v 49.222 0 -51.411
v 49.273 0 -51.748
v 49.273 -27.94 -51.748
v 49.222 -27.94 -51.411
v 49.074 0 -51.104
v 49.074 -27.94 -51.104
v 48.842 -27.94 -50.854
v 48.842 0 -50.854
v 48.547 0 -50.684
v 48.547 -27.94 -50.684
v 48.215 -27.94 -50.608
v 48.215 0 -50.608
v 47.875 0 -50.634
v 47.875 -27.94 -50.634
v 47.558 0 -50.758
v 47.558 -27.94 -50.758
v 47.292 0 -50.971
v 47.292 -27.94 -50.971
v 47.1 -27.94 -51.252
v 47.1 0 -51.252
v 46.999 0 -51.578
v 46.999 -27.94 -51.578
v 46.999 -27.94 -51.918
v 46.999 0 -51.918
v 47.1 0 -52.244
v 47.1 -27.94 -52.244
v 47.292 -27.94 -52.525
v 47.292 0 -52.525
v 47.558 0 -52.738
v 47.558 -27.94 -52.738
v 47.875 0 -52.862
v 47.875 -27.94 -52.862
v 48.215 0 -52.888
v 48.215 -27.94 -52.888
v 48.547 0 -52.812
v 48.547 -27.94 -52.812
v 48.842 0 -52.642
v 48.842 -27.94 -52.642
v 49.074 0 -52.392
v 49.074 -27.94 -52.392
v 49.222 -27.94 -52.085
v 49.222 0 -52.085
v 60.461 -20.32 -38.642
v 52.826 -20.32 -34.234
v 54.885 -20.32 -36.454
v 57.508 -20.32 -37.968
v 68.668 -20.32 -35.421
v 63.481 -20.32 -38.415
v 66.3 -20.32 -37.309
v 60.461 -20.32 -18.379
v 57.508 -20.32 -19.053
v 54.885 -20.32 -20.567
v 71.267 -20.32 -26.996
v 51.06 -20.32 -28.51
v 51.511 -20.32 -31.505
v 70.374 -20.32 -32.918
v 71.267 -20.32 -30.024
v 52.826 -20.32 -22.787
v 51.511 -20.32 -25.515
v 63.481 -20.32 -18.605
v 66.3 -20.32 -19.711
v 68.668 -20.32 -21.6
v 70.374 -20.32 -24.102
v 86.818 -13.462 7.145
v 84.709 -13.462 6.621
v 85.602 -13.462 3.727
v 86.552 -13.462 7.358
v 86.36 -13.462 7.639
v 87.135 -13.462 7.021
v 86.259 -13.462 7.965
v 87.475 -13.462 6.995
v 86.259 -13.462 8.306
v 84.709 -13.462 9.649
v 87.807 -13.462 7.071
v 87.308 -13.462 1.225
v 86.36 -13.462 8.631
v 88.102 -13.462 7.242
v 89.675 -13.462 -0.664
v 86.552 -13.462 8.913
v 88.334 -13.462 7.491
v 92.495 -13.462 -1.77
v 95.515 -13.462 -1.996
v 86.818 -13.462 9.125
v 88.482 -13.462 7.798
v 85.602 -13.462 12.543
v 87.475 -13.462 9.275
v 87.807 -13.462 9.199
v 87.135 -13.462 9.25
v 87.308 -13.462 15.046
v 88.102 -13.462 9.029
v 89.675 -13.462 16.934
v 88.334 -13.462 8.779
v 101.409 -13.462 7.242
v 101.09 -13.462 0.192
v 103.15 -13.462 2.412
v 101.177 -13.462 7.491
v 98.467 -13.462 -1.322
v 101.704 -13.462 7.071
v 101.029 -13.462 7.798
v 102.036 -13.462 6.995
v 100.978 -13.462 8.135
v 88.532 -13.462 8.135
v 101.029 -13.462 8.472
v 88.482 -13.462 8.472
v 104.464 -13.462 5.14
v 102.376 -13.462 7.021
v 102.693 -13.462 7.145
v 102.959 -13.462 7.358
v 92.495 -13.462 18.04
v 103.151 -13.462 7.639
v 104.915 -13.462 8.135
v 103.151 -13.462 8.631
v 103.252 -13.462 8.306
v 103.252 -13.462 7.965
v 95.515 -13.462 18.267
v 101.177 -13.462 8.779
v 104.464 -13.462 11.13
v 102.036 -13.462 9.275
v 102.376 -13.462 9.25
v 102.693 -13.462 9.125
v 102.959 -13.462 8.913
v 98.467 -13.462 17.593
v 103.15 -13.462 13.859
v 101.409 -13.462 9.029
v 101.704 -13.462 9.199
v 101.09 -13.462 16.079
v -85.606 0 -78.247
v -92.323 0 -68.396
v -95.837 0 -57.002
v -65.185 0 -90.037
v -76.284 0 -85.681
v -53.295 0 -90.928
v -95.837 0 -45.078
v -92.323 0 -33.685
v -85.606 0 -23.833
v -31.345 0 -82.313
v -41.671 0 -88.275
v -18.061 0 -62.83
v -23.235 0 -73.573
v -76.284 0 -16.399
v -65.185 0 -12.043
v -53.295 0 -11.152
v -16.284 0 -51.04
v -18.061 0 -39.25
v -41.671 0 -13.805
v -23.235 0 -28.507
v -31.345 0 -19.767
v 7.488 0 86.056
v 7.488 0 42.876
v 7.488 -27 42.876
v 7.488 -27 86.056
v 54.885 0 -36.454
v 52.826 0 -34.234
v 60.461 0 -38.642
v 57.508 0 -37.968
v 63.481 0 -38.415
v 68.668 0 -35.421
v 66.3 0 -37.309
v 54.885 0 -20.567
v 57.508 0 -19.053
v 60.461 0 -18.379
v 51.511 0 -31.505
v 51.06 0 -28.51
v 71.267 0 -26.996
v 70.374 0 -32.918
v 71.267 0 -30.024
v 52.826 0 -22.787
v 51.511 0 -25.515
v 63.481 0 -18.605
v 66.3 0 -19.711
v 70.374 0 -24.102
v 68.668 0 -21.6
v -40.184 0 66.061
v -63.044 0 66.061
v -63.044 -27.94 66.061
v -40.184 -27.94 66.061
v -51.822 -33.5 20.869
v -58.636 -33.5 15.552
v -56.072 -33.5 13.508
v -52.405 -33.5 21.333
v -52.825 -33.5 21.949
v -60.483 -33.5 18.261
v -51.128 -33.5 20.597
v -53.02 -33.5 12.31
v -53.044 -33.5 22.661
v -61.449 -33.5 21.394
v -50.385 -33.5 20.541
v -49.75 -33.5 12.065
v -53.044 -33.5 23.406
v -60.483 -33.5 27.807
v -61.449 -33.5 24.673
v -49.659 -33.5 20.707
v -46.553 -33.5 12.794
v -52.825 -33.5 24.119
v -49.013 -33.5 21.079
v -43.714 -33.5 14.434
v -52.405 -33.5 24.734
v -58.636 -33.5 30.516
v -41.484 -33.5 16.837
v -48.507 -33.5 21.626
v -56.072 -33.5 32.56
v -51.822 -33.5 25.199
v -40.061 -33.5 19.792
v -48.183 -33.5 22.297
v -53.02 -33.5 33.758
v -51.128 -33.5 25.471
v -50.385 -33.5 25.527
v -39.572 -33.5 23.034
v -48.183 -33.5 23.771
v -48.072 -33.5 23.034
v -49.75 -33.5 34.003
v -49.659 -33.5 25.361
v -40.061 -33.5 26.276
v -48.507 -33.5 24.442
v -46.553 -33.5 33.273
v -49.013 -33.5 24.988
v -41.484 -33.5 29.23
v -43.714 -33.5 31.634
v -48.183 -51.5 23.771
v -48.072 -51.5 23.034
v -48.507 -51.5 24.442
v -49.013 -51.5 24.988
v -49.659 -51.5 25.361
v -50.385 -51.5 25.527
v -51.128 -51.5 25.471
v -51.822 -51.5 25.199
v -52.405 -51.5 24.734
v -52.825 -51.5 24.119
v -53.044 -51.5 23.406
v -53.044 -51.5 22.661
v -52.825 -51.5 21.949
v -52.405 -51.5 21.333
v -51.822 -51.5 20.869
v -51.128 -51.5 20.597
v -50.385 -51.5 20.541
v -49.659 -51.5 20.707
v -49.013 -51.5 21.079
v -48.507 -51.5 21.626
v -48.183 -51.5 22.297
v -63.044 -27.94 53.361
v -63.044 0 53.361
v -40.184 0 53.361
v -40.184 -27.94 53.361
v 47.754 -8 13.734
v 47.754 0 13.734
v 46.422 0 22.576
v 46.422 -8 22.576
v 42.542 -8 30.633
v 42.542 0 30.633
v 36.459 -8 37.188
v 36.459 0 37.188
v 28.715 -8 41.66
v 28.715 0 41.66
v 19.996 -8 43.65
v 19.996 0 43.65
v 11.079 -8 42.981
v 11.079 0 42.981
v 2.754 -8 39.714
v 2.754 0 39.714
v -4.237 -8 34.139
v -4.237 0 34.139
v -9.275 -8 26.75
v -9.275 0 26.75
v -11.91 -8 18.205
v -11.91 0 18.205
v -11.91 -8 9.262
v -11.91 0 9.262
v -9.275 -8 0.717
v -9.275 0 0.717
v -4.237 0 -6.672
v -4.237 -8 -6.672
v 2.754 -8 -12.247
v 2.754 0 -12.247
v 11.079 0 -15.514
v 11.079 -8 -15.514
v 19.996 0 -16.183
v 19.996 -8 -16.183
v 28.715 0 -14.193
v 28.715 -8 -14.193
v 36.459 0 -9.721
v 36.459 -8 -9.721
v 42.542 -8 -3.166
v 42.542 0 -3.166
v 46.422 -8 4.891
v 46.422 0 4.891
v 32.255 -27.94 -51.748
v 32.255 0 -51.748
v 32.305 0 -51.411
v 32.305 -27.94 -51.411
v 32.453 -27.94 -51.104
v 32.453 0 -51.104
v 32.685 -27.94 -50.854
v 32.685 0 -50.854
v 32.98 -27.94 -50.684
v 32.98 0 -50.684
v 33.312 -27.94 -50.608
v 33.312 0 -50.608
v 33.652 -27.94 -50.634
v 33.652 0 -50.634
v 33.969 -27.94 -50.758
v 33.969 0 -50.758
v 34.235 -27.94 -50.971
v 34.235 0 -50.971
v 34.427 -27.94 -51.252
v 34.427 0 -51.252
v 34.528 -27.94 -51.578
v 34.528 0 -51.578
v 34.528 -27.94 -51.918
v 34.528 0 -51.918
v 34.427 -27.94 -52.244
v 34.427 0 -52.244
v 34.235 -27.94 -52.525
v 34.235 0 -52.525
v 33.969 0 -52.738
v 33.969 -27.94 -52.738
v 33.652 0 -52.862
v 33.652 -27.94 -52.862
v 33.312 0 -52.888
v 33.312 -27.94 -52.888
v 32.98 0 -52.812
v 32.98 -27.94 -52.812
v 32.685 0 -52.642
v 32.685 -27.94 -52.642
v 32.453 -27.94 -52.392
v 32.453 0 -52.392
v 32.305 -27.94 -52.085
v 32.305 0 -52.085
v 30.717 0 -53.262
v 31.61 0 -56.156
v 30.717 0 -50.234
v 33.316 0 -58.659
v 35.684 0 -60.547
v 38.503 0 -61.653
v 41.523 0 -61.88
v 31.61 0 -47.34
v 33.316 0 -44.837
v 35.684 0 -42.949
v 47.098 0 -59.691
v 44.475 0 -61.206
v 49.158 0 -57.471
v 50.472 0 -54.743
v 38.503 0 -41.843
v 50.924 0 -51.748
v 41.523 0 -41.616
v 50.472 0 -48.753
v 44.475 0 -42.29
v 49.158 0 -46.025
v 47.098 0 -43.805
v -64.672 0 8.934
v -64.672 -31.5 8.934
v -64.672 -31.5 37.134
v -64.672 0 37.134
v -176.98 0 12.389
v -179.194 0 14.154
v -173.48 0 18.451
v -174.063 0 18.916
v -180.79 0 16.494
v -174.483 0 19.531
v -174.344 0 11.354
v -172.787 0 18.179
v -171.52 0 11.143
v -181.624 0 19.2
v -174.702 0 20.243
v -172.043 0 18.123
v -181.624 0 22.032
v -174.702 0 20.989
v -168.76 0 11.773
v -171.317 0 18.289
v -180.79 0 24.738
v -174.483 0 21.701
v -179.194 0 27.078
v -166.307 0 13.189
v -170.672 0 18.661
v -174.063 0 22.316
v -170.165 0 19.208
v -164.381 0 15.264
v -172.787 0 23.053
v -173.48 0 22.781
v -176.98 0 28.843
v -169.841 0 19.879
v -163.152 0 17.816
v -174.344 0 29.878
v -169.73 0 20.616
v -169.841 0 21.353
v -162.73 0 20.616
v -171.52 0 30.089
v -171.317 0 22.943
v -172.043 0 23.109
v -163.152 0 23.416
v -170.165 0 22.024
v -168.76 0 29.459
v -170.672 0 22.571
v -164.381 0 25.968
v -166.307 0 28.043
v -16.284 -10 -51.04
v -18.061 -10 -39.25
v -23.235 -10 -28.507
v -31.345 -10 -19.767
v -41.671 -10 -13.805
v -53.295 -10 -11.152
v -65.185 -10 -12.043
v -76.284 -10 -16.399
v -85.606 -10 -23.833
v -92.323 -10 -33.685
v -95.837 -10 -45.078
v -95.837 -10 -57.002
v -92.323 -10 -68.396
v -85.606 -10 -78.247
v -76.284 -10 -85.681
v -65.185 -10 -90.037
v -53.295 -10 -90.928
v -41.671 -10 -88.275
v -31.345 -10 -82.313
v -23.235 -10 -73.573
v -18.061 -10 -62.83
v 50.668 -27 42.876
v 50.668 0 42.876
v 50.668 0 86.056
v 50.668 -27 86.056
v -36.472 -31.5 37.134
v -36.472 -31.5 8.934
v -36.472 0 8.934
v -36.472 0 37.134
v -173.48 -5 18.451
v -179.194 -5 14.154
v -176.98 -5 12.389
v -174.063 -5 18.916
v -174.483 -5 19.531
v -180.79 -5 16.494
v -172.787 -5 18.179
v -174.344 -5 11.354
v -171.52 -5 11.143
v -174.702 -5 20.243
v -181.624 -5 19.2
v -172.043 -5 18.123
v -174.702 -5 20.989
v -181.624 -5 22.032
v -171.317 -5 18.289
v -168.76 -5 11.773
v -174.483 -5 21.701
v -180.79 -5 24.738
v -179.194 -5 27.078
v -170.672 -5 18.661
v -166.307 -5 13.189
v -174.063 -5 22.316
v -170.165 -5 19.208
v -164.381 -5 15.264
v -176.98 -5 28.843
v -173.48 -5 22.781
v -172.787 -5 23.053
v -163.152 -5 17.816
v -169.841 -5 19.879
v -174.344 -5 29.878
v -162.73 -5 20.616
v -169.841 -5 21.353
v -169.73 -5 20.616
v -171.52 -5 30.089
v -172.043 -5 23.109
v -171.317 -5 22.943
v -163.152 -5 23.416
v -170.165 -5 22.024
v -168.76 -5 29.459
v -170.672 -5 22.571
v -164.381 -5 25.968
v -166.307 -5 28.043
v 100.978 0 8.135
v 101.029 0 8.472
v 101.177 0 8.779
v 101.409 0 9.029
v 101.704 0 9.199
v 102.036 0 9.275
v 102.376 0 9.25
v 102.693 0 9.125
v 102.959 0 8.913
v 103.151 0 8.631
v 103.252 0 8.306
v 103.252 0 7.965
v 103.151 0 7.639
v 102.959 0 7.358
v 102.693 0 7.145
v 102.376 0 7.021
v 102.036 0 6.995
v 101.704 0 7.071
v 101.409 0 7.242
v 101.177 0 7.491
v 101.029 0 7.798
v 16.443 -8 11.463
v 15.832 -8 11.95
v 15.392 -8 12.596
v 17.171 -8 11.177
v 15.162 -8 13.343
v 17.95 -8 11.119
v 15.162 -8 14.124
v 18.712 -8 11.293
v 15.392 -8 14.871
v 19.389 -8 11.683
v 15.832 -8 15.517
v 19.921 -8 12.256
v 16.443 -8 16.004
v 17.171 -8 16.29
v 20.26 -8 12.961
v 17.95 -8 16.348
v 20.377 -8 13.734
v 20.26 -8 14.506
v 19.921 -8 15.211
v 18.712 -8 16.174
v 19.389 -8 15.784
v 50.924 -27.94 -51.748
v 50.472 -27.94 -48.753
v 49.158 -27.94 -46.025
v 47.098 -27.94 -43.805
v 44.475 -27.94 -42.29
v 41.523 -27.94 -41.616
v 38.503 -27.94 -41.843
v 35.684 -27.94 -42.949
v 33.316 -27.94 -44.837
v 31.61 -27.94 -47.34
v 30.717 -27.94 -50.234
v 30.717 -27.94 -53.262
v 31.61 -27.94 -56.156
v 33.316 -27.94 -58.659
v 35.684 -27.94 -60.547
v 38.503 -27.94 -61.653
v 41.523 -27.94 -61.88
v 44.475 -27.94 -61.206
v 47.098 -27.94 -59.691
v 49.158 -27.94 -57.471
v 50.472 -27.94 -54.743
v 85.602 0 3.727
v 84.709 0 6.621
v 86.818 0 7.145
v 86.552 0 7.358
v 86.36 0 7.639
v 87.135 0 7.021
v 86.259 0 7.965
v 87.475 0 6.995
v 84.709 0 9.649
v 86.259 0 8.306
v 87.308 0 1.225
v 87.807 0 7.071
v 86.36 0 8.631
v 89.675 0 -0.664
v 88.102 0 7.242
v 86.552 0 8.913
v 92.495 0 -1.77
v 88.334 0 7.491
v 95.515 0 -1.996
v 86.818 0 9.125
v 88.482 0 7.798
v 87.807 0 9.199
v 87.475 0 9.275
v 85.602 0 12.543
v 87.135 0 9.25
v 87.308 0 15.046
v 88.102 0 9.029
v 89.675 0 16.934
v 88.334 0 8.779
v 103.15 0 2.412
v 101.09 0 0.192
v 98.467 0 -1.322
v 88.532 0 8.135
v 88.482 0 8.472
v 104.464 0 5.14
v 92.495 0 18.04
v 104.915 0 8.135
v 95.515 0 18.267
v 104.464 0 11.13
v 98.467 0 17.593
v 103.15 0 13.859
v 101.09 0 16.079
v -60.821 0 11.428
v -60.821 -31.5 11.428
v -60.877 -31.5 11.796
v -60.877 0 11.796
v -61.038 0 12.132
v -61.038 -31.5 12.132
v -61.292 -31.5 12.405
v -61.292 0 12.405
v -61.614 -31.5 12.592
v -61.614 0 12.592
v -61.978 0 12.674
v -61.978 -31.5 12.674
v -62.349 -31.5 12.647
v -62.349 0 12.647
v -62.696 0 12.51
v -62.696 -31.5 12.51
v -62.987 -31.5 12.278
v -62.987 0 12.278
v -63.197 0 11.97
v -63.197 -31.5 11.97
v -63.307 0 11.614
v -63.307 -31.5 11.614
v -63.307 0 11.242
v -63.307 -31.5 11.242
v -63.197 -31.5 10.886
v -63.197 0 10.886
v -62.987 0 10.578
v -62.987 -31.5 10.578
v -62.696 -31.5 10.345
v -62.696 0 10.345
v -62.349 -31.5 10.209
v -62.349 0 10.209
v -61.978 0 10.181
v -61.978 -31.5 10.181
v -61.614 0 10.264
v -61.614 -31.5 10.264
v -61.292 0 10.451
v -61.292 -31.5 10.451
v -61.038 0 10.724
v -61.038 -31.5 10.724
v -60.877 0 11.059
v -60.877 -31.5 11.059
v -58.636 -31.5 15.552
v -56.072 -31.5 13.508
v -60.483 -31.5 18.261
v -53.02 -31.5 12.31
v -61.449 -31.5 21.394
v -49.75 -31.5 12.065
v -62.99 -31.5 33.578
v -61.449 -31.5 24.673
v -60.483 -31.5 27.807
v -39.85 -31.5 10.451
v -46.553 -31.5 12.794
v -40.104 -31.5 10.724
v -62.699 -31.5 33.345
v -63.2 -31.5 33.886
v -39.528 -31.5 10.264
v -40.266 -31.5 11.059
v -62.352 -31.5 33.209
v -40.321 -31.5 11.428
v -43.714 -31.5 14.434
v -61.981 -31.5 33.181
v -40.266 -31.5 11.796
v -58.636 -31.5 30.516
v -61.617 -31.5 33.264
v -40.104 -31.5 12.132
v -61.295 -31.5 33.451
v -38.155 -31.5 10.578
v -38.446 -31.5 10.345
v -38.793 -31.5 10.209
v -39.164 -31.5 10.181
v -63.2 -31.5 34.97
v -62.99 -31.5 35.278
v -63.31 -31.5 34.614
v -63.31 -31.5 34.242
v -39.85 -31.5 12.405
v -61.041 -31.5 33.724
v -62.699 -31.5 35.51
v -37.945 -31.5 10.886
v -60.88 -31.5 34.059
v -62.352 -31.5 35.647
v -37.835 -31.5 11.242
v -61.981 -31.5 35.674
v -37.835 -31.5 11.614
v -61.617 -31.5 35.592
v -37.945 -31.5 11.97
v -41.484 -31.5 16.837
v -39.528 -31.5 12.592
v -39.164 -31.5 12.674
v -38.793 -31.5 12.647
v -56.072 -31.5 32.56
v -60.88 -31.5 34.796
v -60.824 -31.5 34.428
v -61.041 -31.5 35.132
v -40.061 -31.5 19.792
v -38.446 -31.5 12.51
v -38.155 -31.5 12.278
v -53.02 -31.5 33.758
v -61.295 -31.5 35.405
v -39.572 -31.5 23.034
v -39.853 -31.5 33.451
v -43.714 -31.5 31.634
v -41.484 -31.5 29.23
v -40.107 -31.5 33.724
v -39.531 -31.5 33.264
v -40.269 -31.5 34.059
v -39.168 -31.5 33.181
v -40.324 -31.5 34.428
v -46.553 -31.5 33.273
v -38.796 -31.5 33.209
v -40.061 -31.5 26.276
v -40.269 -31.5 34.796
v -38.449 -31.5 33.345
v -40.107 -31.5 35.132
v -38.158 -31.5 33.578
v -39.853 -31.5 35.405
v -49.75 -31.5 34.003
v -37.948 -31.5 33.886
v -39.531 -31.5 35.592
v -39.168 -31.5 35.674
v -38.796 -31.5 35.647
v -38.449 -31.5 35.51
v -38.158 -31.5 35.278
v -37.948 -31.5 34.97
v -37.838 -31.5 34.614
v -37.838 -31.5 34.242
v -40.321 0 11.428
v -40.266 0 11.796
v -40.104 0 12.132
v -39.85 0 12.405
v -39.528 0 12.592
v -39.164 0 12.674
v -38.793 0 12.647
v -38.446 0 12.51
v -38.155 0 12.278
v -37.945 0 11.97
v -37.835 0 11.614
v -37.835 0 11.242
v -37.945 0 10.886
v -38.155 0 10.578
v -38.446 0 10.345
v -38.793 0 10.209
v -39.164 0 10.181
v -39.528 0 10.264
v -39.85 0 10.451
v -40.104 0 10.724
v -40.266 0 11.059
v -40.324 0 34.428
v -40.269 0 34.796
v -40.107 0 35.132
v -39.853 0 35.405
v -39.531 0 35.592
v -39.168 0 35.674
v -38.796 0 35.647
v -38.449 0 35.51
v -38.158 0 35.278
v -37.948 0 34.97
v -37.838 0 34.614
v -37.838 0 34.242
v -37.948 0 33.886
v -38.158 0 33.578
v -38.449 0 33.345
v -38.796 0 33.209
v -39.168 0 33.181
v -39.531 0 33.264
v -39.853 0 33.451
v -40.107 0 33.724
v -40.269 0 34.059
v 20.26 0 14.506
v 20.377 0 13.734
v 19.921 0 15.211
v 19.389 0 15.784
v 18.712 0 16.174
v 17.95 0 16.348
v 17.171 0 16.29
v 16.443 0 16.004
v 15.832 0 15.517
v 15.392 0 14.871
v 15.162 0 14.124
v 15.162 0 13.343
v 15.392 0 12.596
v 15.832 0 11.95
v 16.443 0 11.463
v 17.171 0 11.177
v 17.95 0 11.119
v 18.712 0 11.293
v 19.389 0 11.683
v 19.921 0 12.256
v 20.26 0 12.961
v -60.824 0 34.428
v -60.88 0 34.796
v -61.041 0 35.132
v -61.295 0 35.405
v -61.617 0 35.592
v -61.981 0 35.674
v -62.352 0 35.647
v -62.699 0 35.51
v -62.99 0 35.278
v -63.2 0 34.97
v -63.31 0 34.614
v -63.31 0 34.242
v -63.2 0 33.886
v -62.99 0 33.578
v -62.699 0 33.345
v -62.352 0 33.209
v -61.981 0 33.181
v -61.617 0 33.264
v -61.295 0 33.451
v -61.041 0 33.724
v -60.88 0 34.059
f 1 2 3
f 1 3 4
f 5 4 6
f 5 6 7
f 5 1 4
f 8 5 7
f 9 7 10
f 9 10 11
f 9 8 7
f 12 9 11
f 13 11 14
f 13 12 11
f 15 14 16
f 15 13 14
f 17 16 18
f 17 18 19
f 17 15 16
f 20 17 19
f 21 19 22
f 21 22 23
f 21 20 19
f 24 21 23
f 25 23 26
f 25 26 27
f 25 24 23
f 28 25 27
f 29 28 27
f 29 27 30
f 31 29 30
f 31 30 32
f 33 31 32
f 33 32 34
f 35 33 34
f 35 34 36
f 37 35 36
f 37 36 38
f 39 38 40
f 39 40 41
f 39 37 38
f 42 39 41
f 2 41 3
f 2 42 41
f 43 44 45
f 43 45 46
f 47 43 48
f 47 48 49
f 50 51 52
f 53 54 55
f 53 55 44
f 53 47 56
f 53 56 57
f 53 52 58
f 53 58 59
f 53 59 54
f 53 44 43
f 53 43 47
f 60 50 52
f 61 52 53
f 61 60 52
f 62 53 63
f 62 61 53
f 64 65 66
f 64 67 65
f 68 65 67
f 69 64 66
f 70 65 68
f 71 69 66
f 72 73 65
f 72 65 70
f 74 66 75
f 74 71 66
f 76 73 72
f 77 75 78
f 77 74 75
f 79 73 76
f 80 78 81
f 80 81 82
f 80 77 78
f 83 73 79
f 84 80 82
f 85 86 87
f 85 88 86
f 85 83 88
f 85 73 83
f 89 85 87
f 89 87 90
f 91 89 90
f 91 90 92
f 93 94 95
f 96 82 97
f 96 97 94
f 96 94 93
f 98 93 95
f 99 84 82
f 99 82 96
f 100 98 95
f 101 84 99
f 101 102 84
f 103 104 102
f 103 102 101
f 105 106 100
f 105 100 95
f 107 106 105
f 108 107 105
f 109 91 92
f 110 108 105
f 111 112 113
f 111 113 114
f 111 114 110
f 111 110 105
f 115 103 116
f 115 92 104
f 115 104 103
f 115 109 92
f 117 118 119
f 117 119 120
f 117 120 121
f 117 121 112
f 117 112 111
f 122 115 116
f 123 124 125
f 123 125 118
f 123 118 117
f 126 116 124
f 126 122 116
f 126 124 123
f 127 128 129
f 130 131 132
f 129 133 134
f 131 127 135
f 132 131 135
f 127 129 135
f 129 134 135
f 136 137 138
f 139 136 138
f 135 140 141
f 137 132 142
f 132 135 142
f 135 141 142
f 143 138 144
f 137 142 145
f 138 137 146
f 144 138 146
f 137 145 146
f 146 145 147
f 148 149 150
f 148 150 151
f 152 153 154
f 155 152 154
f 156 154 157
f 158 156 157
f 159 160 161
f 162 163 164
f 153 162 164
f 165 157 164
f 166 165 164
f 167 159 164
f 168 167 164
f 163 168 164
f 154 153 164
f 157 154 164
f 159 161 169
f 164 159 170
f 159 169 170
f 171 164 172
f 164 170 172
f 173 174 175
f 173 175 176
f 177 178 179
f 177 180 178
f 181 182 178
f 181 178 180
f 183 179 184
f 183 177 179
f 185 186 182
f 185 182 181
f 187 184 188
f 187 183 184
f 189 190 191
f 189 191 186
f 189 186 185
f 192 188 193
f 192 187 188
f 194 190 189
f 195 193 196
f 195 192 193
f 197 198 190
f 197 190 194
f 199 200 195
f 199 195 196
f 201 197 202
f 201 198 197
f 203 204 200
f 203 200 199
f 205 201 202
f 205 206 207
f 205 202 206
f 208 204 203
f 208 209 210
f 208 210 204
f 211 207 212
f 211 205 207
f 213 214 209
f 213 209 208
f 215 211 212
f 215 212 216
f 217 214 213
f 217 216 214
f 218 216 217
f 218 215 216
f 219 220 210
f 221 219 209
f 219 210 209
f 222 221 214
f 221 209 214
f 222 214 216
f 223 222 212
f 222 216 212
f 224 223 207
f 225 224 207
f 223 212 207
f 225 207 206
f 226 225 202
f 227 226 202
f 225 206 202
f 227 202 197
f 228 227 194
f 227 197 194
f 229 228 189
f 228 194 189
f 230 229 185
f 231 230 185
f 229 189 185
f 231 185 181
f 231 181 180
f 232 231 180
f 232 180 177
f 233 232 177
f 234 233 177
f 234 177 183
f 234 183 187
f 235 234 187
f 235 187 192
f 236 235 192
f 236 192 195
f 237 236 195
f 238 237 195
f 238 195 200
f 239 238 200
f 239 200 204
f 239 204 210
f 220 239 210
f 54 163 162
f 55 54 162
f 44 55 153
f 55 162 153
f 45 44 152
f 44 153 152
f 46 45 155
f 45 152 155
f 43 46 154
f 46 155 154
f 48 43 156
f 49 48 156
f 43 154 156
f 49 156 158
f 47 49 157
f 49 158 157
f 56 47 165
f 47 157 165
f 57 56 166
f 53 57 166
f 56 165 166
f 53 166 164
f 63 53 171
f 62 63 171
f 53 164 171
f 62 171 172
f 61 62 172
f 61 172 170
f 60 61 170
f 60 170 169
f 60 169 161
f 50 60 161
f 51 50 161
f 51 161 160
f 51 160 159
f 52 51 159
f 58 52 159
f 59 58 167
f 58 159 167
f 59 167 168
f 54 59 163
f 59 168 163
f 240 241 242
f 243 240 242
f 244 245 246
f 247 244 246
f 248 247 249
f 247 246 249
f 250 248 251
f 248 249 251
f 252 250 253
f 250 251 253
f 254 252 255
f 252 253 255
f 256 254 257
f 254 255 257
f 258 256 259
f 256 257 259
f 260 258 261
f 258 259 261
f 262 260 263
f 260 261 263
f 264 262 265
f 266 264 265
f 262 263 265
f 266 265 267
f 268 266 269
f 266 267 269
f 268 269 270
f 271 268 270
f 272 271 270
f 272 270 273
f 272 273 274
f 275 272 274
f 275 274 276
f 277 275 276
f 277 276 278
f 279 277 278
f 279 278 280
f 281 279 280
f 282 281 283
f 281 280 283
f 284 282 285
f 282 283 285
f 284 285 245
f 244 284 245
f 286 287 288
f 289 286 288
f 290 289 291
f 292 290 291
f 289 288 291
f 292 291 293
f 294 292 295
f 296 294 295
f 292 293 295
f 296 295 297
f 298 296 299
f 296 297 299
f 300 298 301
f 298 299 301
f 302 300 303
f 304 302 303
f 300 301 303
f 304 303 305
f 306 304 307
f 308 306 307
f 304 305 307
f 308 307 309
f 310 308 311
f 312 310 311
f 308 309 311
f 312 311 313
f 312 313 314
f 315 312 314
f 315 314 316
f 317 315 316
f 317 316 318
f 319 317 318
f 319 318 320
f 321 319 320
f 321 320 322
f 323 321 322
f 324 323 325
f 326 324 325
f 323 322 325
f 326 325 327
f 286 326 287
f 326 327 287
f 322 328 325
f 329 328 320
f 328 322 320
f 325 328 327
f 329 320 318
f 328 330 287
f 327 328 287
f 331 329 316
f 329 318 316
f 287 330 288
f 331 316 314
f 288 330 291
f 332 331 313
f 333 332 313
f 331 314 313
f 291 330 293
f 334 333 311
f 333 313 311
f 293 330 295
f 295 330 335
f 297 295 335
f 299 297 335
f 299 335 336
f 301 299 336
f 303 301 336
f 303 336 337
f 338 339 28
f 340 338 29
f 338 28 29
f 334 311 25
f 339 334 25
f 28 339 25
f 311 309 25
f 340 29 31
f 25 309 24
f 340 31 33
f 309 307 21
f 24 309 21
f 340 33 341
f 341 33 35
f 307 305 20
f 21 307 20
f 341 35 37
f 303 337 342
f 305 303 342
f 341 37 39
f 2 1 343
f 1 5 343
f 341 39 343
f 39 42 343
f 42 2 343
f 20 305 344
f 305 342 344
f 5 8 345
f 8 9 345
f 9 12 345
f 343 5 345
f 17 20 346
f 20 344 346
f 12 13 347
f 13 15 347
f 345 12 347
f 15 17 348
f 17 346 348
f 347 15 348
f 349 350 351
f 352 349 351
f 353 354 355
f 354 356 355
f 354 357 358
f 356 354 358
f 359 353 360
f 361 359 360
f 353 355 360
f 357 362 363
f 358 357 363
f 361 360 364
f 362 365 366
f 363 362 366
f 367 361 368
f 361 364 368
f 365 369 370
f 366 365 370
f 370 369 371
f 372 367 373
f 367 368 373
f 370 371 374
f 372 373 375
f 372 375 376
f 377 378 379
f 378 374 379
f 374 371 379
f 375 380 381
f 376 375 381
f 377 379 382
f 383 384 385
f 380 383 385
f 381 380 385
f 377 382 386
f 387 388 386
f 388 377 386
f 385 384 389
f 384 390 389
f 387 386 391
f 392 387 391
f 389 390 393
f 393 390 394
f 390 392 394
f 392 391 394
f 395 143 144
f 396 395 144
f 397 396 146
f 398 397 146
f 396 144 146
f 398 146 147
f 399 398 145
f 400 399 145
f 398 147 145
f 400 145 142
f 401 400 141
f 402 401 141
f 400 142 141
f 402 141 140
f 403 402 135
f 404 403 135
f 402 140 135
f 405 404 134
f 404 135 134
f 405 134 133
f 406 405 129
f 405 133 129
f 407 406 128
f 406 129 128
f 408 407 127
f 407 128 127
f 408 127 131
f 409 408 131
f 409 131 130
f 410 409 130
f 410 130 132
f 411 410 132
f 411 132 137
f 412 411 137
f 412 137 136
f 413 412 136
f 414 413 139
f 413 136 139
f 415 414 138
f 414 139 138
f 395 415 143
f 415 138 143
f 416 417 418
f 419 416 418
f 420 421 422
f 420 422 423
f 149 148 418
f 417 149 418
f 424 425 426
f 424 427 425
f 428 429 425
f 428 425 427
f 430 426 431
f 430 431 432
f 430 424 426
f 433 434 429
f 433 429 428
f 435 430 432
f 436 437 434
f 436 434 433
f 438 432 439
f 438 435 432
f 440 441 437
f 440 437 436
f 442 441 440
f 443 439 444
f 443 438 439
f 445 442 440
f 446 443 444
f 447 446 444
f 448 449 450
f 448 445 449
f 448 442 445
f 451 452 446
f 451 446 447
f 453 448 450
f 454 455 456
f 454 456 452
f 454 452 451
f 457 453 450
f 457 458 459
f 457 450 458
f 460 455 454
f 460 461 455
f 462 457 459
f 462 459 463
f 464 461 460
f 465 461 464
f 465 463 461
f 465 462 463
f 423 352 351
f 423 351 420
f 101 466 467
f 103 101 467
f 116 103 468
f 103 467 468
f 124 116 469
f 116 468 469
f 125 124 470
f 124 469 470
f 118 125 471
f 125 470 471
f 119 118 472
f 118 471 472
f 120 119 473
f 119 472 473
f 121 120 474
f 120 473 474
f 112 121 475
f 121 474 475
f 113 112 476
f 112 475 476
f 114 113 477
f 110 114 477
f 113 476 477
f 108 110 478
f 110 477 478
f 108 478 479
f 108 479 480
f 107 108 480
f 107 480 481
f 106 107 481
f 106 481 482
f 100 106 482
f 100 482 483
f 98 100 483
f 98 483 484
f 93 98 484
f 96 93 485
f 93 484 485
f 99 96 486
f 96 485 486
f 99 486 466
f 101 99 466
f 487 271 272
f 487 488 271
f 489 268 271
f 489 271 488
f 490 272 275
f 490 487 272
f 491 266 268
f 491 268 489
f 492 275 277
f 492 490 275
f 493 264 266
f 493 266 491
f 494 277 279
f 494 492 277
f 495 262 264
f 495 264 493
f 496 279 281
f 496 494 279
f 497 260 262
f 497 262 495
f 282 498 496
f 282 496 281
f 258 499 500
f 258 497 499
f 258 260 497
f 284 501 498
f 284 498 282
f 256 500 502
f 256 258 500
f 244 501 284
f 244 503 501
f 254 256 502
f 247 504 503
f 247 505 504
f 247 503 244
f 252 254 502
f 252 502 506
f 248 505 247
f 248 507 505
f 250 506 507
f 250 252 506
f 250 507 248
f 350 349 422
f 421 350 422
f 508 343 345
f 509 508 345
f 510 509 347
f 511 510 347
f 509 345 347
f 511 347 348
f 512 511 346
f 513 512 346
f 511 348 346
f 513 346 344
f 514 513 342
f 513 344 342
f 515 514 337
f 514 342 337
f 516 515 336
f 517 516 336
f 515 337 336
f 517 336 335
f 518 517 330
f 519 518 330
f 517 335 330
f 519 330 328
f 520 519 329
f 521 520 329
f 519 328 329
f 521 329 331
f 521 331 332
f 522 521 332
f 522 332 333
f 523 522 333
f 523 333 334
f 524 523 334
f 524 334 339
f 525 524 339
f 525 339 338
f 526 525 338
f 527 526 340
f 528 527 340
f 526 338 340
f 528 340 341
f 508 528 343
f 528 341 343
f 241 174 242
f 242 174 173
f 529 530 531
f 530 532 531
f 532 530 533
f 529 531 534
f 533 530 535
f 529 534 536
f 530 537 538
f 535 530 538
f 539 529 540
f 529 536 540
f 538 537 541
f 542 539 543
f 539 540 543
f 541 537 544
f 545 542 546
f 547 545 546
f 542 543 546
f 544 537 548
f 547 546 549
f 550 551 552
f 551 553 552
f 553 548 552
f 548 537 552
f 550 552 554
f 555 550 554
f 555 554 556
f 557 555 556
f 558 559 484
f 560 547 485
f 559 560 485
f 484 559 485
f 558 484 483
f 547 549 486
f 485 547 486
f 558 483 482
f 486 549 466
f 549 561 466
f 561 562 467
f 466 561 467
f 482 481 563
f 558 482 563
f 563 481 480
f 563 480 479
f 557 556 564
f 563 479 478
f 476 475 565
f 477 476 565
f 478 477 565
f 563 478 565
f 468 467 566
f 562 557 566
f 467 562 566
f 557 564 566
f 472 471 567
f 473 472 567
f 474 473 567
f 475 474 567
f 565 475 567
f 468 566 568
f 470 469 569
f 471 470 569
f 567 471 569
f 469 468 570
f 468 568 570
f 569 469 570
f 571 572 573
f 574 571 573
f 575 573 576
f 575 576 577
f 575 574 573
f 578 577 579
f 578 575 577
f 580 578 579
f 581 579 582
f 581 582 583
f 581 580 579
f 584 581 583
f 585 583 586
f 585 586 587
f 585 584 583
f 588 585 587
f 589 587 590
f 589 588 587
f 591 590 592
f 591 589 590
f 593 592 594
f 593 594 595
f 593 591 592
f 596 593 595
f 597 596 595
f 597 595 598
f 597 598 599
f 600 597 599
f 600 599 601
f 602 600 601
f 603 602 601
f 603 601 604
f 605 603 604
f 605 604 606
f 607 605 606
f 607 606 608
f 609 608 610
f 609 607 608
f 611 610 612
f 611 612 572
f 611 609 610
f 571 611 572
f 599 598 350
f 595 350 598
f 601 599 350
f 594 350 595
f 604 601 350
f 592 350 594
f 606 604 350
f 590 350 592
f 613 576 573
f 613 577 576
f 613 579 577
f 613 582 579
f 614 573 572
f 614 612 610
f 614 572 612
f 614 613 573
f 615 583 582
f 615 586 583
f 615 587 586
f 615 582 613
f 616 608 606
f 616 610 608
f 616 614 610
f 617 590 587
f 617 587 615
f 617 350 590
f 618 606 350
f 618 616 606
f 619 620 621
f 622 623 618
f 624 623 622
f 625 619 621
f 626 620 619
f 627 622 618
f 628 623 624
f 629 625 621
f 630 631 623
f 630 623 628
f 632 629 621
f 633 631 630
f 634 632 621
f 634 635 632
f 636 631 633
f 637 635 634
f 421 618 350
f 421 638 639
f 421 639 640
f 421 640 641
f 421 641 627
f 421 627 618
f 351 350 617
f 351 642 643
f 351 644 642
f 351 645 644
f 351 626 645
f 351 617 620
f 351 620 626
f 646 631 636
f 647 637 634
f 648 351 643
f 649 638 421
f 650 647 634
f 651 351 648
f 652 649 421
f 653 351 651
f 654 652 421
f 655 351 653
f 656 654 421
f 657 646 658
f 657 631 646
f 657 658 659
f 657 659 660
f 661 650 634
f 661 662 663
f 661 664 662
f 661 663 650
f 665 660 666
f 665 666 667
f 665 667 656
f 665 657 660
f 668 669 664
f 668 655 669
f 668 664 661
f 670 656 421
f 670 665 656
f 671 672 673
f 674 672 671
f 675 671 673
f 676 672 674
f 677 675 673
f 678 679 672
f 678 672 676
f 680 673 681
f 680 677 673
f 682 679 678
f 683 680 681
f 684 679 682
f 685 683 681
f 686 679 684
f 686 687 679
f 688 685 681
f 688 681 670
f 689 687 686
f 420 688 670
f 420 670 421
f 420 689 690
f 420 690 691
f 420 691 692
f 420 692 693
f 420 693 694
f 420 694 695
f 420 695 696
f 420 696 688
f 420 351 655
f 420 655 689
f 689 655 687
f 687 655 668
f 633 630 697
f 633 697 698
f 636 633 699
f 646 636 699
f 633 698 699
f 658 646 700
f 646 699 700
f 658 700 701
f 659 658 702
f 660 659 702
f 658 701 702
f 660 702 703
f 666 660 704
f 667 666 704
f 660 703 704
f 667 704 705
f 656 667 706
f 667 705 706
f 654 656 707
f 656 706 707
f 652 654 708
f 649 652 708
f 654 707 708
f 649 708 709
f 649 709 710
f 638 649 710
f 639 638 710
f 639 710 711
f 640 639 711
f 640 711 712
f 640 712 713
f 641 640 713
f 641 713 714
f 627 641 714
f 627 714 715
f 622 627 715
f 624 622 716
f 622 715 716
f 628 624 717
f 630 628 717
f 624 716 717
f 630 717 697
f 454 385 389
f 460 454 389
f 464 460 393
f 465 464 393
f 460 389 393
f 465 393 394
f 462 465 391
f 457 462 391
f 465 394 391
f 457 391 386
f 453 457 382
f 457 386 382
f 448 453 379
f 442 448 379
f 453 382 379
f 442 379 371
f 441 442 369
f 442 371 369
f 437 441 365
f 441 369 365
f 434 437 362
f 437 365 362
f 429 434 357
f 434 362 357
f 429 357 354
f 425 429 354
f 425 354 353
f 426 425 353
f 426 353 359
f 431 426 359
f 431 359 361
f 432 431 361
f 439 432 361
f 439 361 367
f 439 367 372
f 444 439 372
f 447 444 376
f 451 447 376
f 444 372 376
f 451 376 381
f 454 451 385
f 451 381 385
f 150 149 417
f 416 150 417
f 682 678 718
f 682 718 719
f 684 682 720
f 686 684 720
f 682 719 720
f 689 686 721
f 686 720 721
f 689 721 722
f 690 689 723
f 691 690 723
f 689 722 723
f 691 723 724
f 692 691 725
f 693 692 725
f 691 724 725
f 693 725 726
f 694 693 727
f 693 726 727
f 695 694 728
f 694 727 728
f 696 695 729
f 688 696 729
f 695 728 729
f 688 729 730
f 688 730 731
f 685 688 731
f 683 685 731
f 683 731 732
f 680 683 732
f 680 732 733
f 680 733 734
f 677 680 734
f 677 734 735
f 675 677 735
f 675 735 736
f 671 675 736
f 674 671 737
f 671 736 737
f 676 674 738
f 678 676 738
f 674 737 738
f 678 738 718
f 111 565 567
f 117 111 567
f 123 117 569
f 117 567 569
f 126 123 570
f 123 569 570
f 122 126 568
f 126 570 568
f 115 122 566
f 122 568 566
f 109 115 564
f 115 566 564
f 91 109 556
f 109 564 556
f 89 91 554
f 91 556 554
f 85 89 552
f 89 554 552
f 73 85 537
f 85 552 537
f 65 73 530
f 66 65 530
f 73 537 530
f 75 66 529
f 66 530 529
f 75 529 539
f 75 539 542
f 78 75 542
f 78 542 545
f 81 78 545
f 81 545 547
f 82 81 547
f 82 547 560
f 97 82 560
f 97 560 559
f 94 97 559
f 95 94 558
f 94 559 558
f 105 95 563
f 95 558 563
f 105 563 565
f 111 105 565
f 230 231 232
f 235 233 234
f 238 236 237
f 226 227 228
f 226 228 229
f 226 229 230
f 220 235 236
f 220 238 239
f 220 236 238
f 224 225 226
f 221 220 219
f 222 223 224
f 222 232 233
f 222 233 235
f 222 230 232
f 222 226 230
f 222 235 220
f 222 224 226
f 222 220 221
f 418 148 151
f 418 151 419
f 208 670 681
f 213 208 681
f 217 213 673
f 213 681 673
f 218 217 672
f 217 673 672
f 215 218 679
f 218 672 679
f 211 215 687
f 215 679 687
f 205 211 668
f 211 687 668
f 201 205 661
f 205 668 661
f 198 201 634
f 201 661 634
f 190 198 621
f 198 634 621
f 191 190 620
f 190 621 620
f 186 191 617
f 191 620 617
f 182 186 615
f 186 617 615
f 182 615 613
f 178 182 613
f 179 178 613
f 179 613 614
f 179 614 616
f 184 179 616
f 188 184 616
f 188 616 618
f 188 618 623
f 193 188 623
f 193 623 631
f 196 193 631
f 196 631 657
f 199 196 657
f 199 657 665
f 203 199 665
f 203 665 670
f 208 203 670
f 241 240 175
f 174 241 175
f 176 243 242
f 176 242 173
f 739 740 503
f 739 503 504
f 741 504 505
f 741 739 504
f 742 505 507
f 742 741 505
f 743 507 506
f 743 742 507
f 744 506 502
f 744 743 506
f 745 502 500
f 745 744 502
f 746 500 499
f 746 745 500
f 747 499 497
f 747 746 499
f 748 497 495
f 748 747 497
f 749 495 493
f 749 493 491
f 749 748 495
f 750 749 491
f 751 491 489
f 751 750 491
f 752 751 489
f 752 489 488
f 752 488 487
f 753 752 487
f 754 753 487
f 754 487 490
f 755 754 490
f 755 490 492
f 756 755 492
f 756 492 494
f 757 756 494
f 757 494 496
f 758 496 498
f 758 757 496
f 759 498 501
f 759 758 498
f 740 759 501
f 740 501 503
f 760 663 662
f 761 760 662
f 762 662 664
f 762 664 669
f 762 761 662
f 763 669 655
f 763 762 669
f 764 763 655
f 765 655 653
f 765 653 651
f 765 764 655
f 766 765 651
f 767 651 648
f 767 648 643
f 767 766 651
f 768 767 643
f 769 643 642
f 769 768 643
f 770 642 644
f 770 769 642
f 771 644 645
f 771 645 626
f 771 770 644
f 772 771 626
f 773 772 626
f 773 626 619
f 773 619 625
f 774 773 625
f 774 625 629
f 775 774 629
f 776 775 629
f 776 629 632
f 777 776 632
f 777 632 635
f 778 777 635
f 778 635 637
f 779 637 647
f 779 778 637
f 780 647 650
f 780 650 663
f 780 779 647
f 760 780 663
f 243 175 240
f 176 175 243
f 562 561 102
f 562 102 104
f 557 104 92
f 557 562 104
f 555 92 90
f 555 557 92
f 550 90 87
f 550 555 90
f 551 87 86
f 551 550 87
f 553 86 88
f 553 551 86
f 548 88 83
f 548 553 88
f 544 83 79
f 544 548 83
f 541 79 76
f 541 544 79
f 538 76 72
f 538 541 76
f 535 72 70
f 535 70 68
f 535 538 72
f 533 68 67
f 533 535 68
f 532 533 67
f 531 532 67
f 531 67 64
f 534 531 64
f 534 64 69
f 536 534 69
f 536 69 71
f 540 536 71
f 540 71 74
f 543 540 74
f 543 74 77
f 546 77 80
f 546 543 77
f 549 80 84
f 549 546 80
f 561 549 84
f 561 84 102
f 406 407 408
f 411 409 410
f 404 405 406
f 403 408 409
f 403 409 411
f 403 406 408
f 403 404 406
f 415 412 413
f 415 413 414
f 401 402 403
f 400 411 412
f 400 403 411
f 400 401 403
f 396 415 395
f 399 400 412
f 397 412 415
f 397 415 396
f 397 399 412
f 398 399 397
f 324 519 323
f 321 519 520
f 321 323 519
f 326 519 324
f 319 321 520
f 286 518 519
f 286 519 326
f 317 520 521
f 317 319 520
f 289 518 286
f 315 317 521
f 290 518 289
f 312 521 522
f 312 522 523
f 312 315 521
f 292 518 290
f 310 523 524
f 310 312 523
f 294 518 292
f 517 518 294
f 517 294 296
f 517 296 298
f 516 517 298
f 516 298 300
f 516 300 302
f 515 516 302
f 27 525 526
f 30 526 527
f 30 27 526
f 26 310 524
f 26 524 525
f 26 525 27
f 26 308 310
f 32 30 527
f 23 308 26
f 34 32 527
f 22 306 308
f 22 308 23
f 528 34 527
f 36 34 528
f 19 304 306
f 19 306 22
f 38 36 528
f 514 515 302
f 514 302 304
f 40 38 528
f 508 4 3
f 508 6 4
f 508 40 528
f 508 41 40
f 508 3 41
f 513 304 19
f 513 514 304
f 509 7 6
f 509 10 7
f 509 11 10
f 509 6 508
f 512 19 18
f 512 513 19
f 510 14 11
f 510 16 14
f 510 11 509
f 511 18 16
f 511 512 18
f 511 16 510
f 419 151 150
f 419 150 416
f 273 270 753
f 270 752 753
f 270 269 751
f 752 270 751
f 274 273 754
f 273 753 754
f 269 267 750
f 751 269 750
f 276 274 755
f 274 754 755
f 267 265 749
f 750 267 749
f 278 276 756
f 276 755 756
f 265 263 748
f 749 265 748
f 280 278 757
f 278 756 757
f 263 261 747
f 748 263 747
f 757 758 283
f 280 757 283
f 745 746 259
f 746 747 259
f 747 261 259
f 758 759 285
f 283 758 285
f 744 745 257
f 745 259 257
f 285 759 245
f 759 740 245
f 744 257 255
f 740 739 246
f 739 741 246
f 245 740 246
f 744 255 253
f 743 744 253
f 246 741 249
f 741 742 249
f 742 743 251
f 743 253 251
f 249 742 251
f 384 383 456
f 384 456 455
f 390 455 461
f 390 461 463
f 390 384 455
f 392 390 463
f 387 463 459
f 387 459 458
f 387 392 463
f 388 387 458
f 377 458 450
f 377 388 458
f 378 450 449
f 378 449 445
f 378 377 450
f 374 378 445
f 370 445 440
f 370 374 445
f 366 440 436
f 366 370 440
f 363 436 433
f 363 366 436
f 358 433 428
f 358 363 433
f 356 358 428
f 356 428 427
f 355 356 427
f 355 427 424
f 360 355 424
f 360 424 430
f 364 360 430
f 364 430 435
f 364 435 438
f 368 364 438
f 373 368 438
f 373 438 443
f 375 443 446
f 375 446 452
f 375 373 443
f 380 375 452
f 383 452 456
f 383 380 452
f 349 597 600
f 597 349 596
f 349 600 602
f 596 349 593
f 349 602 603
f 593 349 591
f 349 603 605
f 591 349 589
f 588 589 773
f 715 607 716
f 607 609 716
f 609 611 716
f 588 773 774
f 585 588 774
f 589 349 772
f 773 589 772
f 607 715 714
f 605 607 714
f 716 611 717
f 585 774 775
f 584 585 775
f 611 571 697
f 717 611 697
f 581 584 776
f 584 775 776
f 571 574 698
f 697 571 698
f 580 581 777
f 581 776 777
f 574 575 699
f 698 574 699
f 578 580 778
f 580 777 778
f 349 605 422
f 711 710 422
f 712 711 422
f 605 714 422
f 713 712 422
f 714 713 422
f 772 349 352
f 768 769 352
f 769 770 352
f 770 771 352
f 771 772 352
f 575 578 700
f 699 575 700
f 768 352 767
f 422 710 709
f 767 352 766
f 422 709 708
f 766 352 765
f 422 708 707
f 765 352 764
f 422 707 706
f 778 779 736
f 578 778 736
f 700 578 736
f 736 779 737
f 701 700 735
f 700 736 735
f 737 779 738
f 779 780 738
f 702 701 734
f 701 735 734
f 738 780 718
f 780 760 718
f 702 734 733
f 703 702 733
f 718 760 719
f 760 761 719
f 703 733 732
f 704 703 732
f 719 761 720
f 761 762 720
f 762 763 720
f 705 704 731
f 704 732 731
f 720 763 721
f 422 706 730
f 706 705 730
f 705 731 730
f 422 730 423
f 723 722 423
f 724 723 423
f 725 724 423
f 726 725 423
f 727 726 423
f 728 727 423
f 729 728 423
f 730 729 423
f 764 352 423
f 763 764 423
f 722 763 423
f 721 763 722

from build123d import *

# Parameters (mm, degrees)
F0_R      = 2.5
F1_DEPTH  = 51.5
F0_R_2    = 11
F2_DEPTH  = 33.5
F0_W      = 28.2
F0_H      = 28.2
F0_R_3    = 1.25
F3_DEPTH  = 31.5
F4_R      = 30
F4_R_2    = 2.6221966913
F5_DEPTH  = 8
F6_R      = 40
F7_DEPTH  = 10
F8_R      = 1.143
F9_DEPTH  = 27.94
F10_DEPTH = 20.32
F12_W     = 43.18
F12_H     = 43.18
F13_DEPTH = 27
F14_W     = 22.86
F14_H     = 12.7
F15_DEPTH = 27.94
F8_R_2    = 10.16
F16_DEPTH = 13.462
F6_R_2    = 9.5
F6_R_3    = 2.5
F17_DEPTH = 5


with BuildPart() as f1:
    # F0 (on Front) → F1 (new body)
    with BuildSketch(Plane.XZ):
        with Locations((-50.5721733682, 23.0338863699)):
            Circle(F0_R)
    extrude(amount=F1_DEPTH)

    # F0 (on Front) → F2 (join)
    with BuildSketch(Plane.XZ):
        with Locations((-50.5721733682, 23.0338863699)):
            Circle(F0_R_2)
        with Locations((-50.5721733682, 23.0338863699)):
            Circle(F0_R, mode=Mode.SUBTRACT)
    extrude(amount=F2_DEPTH)

    # F0 (on Front) → F3 (join)
    with BuildSketch(Plane.XZ):
        with Locations((-50.5721733682, 23.0338863699)):
            Rectangle(F0_W, F0_H)
        with Locations((-62.0710501321, 11.4279121988)):
            Circle(F0_R_3, mode=Mode.SUBTRACT)
        with Locations((-50.5721733682, 23.0338863699)):
            Circle(F0_R_2, mode=Mode.SUBTRACT)
        with BuildLine():
            ThreePointArc((-37.8210501321, 11.4279121988), (-39.0710501321, 10.1779121988), (-40.3210501321, 11.4279121988))
            ThreePointArc((-40.3210501321, 11.4279121988), (-39.0710501321, 12.6779121988), (-37.8210501321, 11.4279121988))
        make_face(mode=Mode.SUBTRACT)
        with Locations((-62.074133508, 34.4279121988)):
            Circle(F0_R_3, mode=Mode.SUBTRACT)
        with BuildLine():
            ThreePointArc((-37.824133508, 34.4279121988), (-39.074133508, 33.1779121988), (-40.324133508, 34.4279121988))
            ThreePointArc((-40.324133508, 34.4279121988), (-39.074133508, 35.6779121988), (-37.824133508, 34.4279121988))
        make_face(mode=Mode.SUBTRACT)
    extrude(amount=F3_DEPTH)


with BuildPart() as f5:
    # F4 (on Front) → F5 (new body)
    with BuildSketch(Plane.XZ):
        with Locations((17.754483968, 13.7335173786)):
            Circle(F4_R)
        with Locations((17.754483968, 13.7335173786)):
            Circle(F4_R_2, mode=Mode.SUBTRACT)
    extrude(amount=F5_DEPTH)


with BuildPart() as f7:
    # F6 (on Front) → F7 (new body)
    with BuildSketch(Plane.XZ):
        with Locations((-56.2841445208, -51.0401763022)):
            Circle(F6_R)
    extrude(amount=F7_DEPTH)


with BuildPart() as f9:
    # F8 (on Front) → F9 (new body)
    with BuildSketch(Plane.XZ):
        with BuildLine():
            ThreePointArc((30.6035824945, -51.7479740083), (40.7635824945, -61.9079740083), (50.9235824945, -51.7479740083))
            ThreePointArc((50.9235824945, -51.7479740083), (40.7635824945, -41.5879740083), (30.6035824945, -51.7479740083))
        make_face()
        with BuildLine():
            ThreePointArc((34.5405824945, -51.7479740083), (33.3975824945, -52.8909740083), (32.2545824945, -51.7479740083))
            ThreePointArc((32.2545824945, -51.7479740083), (33.3975824945, -50.6049740083), (34.5405824945, -51.7479740083))
        make_face(mode=Mode.SUBTRACT)
        with Locations((48.1295824945, -51.7479740083)):
            Circle(F8_R, mode=Mode.SUBTRACT)
    extrude(amount=F9_DEPTH)


with BuildPart() as f10:
    # F8 (on Front) → F10 (new body)
    with BuildSketch(Plane.XZ):
        with BuildLine():
            Line((51.0600908363, -28.5101998597), (71.3800908363, -28.5101998597))
            ThreePointArc((71.3800908363, -28.5101998597), (61.2200908363, -18.3501998597), (51.0600908363, -28.5101998597))
        make_face()
        with BuildLine():
            ThreePointArc((51.0600908363, -28.5101998597), (61.2200908363, -38.6701998597), (71.3800908363, -28.5101998597))
            Line((71.3800908363, -28.5101998597), (51.0600908363, -28.5101998597))
        make_face()
    extrude(amount=F10_DEPTH)


with BuildPart() as f13:
    # F12 (on Front) → F13 (new body)
    with BuildSketch(Plane.XZ):
        with Locations((29.0784827137, 64.4657322647)):
            Rectangle(F12_W, F12_H)
    extrude(amount=F13_DEPTH)


with BuildPart() as f15:
    # F14 (on Front) → F15 (new body)
    with BuildSketch(Plane.XZ):
        with Locations((-51.6138804179, 59.7105702839)):
            Rectangle(F14_W, F14_H)
    extrude(amount=F15_DEPTH)


with BuildPart() as f16:
    # F8 (on Front) → F16 (new body)
    with BuildSketch(Plane.XZ):
        with Locations((94.7554989491, 8.1351967528)):
            Circle(F8_R_2)
        with Locations((87.3894989491, 8.1351967528)):
            Circle(F8_R, mode=Mode.SUBTRACT)
        with BuildLine():
            ThreePointArc((103.2644989491, 8.1351967528), (102.1214989491, 6.9921967528), (100.9784989491, 8.1351967528))
            ThreePointArc((100.9784989491, 8.1351967528), (102.1214989491, 9.2781967528), (103.2644989491, 8.1351967528))
        make_face(mode=Mode.SUBTRACT)
    extrude(amount=F16_DEPTH)


with BuildPart() as f17:
    # F6 (on Front) → F17 (new body)
    with BuildSketch(Plane.XZ):
        with Locations((-172.2303181887, 20.6159949303)):
            Circle(F6_R_2)
        with Locations((-172.2303181887, 20.6159949303)):
            Circle(F6_R_3, mode=Mode.SUBTRACT)
    extrude(amount=F17_DEPTH)


solid = Compound([f1.part, f5.part, f7.part, f9.part, f10.part, f13.part, f15.part, f16.part, f17.part])
